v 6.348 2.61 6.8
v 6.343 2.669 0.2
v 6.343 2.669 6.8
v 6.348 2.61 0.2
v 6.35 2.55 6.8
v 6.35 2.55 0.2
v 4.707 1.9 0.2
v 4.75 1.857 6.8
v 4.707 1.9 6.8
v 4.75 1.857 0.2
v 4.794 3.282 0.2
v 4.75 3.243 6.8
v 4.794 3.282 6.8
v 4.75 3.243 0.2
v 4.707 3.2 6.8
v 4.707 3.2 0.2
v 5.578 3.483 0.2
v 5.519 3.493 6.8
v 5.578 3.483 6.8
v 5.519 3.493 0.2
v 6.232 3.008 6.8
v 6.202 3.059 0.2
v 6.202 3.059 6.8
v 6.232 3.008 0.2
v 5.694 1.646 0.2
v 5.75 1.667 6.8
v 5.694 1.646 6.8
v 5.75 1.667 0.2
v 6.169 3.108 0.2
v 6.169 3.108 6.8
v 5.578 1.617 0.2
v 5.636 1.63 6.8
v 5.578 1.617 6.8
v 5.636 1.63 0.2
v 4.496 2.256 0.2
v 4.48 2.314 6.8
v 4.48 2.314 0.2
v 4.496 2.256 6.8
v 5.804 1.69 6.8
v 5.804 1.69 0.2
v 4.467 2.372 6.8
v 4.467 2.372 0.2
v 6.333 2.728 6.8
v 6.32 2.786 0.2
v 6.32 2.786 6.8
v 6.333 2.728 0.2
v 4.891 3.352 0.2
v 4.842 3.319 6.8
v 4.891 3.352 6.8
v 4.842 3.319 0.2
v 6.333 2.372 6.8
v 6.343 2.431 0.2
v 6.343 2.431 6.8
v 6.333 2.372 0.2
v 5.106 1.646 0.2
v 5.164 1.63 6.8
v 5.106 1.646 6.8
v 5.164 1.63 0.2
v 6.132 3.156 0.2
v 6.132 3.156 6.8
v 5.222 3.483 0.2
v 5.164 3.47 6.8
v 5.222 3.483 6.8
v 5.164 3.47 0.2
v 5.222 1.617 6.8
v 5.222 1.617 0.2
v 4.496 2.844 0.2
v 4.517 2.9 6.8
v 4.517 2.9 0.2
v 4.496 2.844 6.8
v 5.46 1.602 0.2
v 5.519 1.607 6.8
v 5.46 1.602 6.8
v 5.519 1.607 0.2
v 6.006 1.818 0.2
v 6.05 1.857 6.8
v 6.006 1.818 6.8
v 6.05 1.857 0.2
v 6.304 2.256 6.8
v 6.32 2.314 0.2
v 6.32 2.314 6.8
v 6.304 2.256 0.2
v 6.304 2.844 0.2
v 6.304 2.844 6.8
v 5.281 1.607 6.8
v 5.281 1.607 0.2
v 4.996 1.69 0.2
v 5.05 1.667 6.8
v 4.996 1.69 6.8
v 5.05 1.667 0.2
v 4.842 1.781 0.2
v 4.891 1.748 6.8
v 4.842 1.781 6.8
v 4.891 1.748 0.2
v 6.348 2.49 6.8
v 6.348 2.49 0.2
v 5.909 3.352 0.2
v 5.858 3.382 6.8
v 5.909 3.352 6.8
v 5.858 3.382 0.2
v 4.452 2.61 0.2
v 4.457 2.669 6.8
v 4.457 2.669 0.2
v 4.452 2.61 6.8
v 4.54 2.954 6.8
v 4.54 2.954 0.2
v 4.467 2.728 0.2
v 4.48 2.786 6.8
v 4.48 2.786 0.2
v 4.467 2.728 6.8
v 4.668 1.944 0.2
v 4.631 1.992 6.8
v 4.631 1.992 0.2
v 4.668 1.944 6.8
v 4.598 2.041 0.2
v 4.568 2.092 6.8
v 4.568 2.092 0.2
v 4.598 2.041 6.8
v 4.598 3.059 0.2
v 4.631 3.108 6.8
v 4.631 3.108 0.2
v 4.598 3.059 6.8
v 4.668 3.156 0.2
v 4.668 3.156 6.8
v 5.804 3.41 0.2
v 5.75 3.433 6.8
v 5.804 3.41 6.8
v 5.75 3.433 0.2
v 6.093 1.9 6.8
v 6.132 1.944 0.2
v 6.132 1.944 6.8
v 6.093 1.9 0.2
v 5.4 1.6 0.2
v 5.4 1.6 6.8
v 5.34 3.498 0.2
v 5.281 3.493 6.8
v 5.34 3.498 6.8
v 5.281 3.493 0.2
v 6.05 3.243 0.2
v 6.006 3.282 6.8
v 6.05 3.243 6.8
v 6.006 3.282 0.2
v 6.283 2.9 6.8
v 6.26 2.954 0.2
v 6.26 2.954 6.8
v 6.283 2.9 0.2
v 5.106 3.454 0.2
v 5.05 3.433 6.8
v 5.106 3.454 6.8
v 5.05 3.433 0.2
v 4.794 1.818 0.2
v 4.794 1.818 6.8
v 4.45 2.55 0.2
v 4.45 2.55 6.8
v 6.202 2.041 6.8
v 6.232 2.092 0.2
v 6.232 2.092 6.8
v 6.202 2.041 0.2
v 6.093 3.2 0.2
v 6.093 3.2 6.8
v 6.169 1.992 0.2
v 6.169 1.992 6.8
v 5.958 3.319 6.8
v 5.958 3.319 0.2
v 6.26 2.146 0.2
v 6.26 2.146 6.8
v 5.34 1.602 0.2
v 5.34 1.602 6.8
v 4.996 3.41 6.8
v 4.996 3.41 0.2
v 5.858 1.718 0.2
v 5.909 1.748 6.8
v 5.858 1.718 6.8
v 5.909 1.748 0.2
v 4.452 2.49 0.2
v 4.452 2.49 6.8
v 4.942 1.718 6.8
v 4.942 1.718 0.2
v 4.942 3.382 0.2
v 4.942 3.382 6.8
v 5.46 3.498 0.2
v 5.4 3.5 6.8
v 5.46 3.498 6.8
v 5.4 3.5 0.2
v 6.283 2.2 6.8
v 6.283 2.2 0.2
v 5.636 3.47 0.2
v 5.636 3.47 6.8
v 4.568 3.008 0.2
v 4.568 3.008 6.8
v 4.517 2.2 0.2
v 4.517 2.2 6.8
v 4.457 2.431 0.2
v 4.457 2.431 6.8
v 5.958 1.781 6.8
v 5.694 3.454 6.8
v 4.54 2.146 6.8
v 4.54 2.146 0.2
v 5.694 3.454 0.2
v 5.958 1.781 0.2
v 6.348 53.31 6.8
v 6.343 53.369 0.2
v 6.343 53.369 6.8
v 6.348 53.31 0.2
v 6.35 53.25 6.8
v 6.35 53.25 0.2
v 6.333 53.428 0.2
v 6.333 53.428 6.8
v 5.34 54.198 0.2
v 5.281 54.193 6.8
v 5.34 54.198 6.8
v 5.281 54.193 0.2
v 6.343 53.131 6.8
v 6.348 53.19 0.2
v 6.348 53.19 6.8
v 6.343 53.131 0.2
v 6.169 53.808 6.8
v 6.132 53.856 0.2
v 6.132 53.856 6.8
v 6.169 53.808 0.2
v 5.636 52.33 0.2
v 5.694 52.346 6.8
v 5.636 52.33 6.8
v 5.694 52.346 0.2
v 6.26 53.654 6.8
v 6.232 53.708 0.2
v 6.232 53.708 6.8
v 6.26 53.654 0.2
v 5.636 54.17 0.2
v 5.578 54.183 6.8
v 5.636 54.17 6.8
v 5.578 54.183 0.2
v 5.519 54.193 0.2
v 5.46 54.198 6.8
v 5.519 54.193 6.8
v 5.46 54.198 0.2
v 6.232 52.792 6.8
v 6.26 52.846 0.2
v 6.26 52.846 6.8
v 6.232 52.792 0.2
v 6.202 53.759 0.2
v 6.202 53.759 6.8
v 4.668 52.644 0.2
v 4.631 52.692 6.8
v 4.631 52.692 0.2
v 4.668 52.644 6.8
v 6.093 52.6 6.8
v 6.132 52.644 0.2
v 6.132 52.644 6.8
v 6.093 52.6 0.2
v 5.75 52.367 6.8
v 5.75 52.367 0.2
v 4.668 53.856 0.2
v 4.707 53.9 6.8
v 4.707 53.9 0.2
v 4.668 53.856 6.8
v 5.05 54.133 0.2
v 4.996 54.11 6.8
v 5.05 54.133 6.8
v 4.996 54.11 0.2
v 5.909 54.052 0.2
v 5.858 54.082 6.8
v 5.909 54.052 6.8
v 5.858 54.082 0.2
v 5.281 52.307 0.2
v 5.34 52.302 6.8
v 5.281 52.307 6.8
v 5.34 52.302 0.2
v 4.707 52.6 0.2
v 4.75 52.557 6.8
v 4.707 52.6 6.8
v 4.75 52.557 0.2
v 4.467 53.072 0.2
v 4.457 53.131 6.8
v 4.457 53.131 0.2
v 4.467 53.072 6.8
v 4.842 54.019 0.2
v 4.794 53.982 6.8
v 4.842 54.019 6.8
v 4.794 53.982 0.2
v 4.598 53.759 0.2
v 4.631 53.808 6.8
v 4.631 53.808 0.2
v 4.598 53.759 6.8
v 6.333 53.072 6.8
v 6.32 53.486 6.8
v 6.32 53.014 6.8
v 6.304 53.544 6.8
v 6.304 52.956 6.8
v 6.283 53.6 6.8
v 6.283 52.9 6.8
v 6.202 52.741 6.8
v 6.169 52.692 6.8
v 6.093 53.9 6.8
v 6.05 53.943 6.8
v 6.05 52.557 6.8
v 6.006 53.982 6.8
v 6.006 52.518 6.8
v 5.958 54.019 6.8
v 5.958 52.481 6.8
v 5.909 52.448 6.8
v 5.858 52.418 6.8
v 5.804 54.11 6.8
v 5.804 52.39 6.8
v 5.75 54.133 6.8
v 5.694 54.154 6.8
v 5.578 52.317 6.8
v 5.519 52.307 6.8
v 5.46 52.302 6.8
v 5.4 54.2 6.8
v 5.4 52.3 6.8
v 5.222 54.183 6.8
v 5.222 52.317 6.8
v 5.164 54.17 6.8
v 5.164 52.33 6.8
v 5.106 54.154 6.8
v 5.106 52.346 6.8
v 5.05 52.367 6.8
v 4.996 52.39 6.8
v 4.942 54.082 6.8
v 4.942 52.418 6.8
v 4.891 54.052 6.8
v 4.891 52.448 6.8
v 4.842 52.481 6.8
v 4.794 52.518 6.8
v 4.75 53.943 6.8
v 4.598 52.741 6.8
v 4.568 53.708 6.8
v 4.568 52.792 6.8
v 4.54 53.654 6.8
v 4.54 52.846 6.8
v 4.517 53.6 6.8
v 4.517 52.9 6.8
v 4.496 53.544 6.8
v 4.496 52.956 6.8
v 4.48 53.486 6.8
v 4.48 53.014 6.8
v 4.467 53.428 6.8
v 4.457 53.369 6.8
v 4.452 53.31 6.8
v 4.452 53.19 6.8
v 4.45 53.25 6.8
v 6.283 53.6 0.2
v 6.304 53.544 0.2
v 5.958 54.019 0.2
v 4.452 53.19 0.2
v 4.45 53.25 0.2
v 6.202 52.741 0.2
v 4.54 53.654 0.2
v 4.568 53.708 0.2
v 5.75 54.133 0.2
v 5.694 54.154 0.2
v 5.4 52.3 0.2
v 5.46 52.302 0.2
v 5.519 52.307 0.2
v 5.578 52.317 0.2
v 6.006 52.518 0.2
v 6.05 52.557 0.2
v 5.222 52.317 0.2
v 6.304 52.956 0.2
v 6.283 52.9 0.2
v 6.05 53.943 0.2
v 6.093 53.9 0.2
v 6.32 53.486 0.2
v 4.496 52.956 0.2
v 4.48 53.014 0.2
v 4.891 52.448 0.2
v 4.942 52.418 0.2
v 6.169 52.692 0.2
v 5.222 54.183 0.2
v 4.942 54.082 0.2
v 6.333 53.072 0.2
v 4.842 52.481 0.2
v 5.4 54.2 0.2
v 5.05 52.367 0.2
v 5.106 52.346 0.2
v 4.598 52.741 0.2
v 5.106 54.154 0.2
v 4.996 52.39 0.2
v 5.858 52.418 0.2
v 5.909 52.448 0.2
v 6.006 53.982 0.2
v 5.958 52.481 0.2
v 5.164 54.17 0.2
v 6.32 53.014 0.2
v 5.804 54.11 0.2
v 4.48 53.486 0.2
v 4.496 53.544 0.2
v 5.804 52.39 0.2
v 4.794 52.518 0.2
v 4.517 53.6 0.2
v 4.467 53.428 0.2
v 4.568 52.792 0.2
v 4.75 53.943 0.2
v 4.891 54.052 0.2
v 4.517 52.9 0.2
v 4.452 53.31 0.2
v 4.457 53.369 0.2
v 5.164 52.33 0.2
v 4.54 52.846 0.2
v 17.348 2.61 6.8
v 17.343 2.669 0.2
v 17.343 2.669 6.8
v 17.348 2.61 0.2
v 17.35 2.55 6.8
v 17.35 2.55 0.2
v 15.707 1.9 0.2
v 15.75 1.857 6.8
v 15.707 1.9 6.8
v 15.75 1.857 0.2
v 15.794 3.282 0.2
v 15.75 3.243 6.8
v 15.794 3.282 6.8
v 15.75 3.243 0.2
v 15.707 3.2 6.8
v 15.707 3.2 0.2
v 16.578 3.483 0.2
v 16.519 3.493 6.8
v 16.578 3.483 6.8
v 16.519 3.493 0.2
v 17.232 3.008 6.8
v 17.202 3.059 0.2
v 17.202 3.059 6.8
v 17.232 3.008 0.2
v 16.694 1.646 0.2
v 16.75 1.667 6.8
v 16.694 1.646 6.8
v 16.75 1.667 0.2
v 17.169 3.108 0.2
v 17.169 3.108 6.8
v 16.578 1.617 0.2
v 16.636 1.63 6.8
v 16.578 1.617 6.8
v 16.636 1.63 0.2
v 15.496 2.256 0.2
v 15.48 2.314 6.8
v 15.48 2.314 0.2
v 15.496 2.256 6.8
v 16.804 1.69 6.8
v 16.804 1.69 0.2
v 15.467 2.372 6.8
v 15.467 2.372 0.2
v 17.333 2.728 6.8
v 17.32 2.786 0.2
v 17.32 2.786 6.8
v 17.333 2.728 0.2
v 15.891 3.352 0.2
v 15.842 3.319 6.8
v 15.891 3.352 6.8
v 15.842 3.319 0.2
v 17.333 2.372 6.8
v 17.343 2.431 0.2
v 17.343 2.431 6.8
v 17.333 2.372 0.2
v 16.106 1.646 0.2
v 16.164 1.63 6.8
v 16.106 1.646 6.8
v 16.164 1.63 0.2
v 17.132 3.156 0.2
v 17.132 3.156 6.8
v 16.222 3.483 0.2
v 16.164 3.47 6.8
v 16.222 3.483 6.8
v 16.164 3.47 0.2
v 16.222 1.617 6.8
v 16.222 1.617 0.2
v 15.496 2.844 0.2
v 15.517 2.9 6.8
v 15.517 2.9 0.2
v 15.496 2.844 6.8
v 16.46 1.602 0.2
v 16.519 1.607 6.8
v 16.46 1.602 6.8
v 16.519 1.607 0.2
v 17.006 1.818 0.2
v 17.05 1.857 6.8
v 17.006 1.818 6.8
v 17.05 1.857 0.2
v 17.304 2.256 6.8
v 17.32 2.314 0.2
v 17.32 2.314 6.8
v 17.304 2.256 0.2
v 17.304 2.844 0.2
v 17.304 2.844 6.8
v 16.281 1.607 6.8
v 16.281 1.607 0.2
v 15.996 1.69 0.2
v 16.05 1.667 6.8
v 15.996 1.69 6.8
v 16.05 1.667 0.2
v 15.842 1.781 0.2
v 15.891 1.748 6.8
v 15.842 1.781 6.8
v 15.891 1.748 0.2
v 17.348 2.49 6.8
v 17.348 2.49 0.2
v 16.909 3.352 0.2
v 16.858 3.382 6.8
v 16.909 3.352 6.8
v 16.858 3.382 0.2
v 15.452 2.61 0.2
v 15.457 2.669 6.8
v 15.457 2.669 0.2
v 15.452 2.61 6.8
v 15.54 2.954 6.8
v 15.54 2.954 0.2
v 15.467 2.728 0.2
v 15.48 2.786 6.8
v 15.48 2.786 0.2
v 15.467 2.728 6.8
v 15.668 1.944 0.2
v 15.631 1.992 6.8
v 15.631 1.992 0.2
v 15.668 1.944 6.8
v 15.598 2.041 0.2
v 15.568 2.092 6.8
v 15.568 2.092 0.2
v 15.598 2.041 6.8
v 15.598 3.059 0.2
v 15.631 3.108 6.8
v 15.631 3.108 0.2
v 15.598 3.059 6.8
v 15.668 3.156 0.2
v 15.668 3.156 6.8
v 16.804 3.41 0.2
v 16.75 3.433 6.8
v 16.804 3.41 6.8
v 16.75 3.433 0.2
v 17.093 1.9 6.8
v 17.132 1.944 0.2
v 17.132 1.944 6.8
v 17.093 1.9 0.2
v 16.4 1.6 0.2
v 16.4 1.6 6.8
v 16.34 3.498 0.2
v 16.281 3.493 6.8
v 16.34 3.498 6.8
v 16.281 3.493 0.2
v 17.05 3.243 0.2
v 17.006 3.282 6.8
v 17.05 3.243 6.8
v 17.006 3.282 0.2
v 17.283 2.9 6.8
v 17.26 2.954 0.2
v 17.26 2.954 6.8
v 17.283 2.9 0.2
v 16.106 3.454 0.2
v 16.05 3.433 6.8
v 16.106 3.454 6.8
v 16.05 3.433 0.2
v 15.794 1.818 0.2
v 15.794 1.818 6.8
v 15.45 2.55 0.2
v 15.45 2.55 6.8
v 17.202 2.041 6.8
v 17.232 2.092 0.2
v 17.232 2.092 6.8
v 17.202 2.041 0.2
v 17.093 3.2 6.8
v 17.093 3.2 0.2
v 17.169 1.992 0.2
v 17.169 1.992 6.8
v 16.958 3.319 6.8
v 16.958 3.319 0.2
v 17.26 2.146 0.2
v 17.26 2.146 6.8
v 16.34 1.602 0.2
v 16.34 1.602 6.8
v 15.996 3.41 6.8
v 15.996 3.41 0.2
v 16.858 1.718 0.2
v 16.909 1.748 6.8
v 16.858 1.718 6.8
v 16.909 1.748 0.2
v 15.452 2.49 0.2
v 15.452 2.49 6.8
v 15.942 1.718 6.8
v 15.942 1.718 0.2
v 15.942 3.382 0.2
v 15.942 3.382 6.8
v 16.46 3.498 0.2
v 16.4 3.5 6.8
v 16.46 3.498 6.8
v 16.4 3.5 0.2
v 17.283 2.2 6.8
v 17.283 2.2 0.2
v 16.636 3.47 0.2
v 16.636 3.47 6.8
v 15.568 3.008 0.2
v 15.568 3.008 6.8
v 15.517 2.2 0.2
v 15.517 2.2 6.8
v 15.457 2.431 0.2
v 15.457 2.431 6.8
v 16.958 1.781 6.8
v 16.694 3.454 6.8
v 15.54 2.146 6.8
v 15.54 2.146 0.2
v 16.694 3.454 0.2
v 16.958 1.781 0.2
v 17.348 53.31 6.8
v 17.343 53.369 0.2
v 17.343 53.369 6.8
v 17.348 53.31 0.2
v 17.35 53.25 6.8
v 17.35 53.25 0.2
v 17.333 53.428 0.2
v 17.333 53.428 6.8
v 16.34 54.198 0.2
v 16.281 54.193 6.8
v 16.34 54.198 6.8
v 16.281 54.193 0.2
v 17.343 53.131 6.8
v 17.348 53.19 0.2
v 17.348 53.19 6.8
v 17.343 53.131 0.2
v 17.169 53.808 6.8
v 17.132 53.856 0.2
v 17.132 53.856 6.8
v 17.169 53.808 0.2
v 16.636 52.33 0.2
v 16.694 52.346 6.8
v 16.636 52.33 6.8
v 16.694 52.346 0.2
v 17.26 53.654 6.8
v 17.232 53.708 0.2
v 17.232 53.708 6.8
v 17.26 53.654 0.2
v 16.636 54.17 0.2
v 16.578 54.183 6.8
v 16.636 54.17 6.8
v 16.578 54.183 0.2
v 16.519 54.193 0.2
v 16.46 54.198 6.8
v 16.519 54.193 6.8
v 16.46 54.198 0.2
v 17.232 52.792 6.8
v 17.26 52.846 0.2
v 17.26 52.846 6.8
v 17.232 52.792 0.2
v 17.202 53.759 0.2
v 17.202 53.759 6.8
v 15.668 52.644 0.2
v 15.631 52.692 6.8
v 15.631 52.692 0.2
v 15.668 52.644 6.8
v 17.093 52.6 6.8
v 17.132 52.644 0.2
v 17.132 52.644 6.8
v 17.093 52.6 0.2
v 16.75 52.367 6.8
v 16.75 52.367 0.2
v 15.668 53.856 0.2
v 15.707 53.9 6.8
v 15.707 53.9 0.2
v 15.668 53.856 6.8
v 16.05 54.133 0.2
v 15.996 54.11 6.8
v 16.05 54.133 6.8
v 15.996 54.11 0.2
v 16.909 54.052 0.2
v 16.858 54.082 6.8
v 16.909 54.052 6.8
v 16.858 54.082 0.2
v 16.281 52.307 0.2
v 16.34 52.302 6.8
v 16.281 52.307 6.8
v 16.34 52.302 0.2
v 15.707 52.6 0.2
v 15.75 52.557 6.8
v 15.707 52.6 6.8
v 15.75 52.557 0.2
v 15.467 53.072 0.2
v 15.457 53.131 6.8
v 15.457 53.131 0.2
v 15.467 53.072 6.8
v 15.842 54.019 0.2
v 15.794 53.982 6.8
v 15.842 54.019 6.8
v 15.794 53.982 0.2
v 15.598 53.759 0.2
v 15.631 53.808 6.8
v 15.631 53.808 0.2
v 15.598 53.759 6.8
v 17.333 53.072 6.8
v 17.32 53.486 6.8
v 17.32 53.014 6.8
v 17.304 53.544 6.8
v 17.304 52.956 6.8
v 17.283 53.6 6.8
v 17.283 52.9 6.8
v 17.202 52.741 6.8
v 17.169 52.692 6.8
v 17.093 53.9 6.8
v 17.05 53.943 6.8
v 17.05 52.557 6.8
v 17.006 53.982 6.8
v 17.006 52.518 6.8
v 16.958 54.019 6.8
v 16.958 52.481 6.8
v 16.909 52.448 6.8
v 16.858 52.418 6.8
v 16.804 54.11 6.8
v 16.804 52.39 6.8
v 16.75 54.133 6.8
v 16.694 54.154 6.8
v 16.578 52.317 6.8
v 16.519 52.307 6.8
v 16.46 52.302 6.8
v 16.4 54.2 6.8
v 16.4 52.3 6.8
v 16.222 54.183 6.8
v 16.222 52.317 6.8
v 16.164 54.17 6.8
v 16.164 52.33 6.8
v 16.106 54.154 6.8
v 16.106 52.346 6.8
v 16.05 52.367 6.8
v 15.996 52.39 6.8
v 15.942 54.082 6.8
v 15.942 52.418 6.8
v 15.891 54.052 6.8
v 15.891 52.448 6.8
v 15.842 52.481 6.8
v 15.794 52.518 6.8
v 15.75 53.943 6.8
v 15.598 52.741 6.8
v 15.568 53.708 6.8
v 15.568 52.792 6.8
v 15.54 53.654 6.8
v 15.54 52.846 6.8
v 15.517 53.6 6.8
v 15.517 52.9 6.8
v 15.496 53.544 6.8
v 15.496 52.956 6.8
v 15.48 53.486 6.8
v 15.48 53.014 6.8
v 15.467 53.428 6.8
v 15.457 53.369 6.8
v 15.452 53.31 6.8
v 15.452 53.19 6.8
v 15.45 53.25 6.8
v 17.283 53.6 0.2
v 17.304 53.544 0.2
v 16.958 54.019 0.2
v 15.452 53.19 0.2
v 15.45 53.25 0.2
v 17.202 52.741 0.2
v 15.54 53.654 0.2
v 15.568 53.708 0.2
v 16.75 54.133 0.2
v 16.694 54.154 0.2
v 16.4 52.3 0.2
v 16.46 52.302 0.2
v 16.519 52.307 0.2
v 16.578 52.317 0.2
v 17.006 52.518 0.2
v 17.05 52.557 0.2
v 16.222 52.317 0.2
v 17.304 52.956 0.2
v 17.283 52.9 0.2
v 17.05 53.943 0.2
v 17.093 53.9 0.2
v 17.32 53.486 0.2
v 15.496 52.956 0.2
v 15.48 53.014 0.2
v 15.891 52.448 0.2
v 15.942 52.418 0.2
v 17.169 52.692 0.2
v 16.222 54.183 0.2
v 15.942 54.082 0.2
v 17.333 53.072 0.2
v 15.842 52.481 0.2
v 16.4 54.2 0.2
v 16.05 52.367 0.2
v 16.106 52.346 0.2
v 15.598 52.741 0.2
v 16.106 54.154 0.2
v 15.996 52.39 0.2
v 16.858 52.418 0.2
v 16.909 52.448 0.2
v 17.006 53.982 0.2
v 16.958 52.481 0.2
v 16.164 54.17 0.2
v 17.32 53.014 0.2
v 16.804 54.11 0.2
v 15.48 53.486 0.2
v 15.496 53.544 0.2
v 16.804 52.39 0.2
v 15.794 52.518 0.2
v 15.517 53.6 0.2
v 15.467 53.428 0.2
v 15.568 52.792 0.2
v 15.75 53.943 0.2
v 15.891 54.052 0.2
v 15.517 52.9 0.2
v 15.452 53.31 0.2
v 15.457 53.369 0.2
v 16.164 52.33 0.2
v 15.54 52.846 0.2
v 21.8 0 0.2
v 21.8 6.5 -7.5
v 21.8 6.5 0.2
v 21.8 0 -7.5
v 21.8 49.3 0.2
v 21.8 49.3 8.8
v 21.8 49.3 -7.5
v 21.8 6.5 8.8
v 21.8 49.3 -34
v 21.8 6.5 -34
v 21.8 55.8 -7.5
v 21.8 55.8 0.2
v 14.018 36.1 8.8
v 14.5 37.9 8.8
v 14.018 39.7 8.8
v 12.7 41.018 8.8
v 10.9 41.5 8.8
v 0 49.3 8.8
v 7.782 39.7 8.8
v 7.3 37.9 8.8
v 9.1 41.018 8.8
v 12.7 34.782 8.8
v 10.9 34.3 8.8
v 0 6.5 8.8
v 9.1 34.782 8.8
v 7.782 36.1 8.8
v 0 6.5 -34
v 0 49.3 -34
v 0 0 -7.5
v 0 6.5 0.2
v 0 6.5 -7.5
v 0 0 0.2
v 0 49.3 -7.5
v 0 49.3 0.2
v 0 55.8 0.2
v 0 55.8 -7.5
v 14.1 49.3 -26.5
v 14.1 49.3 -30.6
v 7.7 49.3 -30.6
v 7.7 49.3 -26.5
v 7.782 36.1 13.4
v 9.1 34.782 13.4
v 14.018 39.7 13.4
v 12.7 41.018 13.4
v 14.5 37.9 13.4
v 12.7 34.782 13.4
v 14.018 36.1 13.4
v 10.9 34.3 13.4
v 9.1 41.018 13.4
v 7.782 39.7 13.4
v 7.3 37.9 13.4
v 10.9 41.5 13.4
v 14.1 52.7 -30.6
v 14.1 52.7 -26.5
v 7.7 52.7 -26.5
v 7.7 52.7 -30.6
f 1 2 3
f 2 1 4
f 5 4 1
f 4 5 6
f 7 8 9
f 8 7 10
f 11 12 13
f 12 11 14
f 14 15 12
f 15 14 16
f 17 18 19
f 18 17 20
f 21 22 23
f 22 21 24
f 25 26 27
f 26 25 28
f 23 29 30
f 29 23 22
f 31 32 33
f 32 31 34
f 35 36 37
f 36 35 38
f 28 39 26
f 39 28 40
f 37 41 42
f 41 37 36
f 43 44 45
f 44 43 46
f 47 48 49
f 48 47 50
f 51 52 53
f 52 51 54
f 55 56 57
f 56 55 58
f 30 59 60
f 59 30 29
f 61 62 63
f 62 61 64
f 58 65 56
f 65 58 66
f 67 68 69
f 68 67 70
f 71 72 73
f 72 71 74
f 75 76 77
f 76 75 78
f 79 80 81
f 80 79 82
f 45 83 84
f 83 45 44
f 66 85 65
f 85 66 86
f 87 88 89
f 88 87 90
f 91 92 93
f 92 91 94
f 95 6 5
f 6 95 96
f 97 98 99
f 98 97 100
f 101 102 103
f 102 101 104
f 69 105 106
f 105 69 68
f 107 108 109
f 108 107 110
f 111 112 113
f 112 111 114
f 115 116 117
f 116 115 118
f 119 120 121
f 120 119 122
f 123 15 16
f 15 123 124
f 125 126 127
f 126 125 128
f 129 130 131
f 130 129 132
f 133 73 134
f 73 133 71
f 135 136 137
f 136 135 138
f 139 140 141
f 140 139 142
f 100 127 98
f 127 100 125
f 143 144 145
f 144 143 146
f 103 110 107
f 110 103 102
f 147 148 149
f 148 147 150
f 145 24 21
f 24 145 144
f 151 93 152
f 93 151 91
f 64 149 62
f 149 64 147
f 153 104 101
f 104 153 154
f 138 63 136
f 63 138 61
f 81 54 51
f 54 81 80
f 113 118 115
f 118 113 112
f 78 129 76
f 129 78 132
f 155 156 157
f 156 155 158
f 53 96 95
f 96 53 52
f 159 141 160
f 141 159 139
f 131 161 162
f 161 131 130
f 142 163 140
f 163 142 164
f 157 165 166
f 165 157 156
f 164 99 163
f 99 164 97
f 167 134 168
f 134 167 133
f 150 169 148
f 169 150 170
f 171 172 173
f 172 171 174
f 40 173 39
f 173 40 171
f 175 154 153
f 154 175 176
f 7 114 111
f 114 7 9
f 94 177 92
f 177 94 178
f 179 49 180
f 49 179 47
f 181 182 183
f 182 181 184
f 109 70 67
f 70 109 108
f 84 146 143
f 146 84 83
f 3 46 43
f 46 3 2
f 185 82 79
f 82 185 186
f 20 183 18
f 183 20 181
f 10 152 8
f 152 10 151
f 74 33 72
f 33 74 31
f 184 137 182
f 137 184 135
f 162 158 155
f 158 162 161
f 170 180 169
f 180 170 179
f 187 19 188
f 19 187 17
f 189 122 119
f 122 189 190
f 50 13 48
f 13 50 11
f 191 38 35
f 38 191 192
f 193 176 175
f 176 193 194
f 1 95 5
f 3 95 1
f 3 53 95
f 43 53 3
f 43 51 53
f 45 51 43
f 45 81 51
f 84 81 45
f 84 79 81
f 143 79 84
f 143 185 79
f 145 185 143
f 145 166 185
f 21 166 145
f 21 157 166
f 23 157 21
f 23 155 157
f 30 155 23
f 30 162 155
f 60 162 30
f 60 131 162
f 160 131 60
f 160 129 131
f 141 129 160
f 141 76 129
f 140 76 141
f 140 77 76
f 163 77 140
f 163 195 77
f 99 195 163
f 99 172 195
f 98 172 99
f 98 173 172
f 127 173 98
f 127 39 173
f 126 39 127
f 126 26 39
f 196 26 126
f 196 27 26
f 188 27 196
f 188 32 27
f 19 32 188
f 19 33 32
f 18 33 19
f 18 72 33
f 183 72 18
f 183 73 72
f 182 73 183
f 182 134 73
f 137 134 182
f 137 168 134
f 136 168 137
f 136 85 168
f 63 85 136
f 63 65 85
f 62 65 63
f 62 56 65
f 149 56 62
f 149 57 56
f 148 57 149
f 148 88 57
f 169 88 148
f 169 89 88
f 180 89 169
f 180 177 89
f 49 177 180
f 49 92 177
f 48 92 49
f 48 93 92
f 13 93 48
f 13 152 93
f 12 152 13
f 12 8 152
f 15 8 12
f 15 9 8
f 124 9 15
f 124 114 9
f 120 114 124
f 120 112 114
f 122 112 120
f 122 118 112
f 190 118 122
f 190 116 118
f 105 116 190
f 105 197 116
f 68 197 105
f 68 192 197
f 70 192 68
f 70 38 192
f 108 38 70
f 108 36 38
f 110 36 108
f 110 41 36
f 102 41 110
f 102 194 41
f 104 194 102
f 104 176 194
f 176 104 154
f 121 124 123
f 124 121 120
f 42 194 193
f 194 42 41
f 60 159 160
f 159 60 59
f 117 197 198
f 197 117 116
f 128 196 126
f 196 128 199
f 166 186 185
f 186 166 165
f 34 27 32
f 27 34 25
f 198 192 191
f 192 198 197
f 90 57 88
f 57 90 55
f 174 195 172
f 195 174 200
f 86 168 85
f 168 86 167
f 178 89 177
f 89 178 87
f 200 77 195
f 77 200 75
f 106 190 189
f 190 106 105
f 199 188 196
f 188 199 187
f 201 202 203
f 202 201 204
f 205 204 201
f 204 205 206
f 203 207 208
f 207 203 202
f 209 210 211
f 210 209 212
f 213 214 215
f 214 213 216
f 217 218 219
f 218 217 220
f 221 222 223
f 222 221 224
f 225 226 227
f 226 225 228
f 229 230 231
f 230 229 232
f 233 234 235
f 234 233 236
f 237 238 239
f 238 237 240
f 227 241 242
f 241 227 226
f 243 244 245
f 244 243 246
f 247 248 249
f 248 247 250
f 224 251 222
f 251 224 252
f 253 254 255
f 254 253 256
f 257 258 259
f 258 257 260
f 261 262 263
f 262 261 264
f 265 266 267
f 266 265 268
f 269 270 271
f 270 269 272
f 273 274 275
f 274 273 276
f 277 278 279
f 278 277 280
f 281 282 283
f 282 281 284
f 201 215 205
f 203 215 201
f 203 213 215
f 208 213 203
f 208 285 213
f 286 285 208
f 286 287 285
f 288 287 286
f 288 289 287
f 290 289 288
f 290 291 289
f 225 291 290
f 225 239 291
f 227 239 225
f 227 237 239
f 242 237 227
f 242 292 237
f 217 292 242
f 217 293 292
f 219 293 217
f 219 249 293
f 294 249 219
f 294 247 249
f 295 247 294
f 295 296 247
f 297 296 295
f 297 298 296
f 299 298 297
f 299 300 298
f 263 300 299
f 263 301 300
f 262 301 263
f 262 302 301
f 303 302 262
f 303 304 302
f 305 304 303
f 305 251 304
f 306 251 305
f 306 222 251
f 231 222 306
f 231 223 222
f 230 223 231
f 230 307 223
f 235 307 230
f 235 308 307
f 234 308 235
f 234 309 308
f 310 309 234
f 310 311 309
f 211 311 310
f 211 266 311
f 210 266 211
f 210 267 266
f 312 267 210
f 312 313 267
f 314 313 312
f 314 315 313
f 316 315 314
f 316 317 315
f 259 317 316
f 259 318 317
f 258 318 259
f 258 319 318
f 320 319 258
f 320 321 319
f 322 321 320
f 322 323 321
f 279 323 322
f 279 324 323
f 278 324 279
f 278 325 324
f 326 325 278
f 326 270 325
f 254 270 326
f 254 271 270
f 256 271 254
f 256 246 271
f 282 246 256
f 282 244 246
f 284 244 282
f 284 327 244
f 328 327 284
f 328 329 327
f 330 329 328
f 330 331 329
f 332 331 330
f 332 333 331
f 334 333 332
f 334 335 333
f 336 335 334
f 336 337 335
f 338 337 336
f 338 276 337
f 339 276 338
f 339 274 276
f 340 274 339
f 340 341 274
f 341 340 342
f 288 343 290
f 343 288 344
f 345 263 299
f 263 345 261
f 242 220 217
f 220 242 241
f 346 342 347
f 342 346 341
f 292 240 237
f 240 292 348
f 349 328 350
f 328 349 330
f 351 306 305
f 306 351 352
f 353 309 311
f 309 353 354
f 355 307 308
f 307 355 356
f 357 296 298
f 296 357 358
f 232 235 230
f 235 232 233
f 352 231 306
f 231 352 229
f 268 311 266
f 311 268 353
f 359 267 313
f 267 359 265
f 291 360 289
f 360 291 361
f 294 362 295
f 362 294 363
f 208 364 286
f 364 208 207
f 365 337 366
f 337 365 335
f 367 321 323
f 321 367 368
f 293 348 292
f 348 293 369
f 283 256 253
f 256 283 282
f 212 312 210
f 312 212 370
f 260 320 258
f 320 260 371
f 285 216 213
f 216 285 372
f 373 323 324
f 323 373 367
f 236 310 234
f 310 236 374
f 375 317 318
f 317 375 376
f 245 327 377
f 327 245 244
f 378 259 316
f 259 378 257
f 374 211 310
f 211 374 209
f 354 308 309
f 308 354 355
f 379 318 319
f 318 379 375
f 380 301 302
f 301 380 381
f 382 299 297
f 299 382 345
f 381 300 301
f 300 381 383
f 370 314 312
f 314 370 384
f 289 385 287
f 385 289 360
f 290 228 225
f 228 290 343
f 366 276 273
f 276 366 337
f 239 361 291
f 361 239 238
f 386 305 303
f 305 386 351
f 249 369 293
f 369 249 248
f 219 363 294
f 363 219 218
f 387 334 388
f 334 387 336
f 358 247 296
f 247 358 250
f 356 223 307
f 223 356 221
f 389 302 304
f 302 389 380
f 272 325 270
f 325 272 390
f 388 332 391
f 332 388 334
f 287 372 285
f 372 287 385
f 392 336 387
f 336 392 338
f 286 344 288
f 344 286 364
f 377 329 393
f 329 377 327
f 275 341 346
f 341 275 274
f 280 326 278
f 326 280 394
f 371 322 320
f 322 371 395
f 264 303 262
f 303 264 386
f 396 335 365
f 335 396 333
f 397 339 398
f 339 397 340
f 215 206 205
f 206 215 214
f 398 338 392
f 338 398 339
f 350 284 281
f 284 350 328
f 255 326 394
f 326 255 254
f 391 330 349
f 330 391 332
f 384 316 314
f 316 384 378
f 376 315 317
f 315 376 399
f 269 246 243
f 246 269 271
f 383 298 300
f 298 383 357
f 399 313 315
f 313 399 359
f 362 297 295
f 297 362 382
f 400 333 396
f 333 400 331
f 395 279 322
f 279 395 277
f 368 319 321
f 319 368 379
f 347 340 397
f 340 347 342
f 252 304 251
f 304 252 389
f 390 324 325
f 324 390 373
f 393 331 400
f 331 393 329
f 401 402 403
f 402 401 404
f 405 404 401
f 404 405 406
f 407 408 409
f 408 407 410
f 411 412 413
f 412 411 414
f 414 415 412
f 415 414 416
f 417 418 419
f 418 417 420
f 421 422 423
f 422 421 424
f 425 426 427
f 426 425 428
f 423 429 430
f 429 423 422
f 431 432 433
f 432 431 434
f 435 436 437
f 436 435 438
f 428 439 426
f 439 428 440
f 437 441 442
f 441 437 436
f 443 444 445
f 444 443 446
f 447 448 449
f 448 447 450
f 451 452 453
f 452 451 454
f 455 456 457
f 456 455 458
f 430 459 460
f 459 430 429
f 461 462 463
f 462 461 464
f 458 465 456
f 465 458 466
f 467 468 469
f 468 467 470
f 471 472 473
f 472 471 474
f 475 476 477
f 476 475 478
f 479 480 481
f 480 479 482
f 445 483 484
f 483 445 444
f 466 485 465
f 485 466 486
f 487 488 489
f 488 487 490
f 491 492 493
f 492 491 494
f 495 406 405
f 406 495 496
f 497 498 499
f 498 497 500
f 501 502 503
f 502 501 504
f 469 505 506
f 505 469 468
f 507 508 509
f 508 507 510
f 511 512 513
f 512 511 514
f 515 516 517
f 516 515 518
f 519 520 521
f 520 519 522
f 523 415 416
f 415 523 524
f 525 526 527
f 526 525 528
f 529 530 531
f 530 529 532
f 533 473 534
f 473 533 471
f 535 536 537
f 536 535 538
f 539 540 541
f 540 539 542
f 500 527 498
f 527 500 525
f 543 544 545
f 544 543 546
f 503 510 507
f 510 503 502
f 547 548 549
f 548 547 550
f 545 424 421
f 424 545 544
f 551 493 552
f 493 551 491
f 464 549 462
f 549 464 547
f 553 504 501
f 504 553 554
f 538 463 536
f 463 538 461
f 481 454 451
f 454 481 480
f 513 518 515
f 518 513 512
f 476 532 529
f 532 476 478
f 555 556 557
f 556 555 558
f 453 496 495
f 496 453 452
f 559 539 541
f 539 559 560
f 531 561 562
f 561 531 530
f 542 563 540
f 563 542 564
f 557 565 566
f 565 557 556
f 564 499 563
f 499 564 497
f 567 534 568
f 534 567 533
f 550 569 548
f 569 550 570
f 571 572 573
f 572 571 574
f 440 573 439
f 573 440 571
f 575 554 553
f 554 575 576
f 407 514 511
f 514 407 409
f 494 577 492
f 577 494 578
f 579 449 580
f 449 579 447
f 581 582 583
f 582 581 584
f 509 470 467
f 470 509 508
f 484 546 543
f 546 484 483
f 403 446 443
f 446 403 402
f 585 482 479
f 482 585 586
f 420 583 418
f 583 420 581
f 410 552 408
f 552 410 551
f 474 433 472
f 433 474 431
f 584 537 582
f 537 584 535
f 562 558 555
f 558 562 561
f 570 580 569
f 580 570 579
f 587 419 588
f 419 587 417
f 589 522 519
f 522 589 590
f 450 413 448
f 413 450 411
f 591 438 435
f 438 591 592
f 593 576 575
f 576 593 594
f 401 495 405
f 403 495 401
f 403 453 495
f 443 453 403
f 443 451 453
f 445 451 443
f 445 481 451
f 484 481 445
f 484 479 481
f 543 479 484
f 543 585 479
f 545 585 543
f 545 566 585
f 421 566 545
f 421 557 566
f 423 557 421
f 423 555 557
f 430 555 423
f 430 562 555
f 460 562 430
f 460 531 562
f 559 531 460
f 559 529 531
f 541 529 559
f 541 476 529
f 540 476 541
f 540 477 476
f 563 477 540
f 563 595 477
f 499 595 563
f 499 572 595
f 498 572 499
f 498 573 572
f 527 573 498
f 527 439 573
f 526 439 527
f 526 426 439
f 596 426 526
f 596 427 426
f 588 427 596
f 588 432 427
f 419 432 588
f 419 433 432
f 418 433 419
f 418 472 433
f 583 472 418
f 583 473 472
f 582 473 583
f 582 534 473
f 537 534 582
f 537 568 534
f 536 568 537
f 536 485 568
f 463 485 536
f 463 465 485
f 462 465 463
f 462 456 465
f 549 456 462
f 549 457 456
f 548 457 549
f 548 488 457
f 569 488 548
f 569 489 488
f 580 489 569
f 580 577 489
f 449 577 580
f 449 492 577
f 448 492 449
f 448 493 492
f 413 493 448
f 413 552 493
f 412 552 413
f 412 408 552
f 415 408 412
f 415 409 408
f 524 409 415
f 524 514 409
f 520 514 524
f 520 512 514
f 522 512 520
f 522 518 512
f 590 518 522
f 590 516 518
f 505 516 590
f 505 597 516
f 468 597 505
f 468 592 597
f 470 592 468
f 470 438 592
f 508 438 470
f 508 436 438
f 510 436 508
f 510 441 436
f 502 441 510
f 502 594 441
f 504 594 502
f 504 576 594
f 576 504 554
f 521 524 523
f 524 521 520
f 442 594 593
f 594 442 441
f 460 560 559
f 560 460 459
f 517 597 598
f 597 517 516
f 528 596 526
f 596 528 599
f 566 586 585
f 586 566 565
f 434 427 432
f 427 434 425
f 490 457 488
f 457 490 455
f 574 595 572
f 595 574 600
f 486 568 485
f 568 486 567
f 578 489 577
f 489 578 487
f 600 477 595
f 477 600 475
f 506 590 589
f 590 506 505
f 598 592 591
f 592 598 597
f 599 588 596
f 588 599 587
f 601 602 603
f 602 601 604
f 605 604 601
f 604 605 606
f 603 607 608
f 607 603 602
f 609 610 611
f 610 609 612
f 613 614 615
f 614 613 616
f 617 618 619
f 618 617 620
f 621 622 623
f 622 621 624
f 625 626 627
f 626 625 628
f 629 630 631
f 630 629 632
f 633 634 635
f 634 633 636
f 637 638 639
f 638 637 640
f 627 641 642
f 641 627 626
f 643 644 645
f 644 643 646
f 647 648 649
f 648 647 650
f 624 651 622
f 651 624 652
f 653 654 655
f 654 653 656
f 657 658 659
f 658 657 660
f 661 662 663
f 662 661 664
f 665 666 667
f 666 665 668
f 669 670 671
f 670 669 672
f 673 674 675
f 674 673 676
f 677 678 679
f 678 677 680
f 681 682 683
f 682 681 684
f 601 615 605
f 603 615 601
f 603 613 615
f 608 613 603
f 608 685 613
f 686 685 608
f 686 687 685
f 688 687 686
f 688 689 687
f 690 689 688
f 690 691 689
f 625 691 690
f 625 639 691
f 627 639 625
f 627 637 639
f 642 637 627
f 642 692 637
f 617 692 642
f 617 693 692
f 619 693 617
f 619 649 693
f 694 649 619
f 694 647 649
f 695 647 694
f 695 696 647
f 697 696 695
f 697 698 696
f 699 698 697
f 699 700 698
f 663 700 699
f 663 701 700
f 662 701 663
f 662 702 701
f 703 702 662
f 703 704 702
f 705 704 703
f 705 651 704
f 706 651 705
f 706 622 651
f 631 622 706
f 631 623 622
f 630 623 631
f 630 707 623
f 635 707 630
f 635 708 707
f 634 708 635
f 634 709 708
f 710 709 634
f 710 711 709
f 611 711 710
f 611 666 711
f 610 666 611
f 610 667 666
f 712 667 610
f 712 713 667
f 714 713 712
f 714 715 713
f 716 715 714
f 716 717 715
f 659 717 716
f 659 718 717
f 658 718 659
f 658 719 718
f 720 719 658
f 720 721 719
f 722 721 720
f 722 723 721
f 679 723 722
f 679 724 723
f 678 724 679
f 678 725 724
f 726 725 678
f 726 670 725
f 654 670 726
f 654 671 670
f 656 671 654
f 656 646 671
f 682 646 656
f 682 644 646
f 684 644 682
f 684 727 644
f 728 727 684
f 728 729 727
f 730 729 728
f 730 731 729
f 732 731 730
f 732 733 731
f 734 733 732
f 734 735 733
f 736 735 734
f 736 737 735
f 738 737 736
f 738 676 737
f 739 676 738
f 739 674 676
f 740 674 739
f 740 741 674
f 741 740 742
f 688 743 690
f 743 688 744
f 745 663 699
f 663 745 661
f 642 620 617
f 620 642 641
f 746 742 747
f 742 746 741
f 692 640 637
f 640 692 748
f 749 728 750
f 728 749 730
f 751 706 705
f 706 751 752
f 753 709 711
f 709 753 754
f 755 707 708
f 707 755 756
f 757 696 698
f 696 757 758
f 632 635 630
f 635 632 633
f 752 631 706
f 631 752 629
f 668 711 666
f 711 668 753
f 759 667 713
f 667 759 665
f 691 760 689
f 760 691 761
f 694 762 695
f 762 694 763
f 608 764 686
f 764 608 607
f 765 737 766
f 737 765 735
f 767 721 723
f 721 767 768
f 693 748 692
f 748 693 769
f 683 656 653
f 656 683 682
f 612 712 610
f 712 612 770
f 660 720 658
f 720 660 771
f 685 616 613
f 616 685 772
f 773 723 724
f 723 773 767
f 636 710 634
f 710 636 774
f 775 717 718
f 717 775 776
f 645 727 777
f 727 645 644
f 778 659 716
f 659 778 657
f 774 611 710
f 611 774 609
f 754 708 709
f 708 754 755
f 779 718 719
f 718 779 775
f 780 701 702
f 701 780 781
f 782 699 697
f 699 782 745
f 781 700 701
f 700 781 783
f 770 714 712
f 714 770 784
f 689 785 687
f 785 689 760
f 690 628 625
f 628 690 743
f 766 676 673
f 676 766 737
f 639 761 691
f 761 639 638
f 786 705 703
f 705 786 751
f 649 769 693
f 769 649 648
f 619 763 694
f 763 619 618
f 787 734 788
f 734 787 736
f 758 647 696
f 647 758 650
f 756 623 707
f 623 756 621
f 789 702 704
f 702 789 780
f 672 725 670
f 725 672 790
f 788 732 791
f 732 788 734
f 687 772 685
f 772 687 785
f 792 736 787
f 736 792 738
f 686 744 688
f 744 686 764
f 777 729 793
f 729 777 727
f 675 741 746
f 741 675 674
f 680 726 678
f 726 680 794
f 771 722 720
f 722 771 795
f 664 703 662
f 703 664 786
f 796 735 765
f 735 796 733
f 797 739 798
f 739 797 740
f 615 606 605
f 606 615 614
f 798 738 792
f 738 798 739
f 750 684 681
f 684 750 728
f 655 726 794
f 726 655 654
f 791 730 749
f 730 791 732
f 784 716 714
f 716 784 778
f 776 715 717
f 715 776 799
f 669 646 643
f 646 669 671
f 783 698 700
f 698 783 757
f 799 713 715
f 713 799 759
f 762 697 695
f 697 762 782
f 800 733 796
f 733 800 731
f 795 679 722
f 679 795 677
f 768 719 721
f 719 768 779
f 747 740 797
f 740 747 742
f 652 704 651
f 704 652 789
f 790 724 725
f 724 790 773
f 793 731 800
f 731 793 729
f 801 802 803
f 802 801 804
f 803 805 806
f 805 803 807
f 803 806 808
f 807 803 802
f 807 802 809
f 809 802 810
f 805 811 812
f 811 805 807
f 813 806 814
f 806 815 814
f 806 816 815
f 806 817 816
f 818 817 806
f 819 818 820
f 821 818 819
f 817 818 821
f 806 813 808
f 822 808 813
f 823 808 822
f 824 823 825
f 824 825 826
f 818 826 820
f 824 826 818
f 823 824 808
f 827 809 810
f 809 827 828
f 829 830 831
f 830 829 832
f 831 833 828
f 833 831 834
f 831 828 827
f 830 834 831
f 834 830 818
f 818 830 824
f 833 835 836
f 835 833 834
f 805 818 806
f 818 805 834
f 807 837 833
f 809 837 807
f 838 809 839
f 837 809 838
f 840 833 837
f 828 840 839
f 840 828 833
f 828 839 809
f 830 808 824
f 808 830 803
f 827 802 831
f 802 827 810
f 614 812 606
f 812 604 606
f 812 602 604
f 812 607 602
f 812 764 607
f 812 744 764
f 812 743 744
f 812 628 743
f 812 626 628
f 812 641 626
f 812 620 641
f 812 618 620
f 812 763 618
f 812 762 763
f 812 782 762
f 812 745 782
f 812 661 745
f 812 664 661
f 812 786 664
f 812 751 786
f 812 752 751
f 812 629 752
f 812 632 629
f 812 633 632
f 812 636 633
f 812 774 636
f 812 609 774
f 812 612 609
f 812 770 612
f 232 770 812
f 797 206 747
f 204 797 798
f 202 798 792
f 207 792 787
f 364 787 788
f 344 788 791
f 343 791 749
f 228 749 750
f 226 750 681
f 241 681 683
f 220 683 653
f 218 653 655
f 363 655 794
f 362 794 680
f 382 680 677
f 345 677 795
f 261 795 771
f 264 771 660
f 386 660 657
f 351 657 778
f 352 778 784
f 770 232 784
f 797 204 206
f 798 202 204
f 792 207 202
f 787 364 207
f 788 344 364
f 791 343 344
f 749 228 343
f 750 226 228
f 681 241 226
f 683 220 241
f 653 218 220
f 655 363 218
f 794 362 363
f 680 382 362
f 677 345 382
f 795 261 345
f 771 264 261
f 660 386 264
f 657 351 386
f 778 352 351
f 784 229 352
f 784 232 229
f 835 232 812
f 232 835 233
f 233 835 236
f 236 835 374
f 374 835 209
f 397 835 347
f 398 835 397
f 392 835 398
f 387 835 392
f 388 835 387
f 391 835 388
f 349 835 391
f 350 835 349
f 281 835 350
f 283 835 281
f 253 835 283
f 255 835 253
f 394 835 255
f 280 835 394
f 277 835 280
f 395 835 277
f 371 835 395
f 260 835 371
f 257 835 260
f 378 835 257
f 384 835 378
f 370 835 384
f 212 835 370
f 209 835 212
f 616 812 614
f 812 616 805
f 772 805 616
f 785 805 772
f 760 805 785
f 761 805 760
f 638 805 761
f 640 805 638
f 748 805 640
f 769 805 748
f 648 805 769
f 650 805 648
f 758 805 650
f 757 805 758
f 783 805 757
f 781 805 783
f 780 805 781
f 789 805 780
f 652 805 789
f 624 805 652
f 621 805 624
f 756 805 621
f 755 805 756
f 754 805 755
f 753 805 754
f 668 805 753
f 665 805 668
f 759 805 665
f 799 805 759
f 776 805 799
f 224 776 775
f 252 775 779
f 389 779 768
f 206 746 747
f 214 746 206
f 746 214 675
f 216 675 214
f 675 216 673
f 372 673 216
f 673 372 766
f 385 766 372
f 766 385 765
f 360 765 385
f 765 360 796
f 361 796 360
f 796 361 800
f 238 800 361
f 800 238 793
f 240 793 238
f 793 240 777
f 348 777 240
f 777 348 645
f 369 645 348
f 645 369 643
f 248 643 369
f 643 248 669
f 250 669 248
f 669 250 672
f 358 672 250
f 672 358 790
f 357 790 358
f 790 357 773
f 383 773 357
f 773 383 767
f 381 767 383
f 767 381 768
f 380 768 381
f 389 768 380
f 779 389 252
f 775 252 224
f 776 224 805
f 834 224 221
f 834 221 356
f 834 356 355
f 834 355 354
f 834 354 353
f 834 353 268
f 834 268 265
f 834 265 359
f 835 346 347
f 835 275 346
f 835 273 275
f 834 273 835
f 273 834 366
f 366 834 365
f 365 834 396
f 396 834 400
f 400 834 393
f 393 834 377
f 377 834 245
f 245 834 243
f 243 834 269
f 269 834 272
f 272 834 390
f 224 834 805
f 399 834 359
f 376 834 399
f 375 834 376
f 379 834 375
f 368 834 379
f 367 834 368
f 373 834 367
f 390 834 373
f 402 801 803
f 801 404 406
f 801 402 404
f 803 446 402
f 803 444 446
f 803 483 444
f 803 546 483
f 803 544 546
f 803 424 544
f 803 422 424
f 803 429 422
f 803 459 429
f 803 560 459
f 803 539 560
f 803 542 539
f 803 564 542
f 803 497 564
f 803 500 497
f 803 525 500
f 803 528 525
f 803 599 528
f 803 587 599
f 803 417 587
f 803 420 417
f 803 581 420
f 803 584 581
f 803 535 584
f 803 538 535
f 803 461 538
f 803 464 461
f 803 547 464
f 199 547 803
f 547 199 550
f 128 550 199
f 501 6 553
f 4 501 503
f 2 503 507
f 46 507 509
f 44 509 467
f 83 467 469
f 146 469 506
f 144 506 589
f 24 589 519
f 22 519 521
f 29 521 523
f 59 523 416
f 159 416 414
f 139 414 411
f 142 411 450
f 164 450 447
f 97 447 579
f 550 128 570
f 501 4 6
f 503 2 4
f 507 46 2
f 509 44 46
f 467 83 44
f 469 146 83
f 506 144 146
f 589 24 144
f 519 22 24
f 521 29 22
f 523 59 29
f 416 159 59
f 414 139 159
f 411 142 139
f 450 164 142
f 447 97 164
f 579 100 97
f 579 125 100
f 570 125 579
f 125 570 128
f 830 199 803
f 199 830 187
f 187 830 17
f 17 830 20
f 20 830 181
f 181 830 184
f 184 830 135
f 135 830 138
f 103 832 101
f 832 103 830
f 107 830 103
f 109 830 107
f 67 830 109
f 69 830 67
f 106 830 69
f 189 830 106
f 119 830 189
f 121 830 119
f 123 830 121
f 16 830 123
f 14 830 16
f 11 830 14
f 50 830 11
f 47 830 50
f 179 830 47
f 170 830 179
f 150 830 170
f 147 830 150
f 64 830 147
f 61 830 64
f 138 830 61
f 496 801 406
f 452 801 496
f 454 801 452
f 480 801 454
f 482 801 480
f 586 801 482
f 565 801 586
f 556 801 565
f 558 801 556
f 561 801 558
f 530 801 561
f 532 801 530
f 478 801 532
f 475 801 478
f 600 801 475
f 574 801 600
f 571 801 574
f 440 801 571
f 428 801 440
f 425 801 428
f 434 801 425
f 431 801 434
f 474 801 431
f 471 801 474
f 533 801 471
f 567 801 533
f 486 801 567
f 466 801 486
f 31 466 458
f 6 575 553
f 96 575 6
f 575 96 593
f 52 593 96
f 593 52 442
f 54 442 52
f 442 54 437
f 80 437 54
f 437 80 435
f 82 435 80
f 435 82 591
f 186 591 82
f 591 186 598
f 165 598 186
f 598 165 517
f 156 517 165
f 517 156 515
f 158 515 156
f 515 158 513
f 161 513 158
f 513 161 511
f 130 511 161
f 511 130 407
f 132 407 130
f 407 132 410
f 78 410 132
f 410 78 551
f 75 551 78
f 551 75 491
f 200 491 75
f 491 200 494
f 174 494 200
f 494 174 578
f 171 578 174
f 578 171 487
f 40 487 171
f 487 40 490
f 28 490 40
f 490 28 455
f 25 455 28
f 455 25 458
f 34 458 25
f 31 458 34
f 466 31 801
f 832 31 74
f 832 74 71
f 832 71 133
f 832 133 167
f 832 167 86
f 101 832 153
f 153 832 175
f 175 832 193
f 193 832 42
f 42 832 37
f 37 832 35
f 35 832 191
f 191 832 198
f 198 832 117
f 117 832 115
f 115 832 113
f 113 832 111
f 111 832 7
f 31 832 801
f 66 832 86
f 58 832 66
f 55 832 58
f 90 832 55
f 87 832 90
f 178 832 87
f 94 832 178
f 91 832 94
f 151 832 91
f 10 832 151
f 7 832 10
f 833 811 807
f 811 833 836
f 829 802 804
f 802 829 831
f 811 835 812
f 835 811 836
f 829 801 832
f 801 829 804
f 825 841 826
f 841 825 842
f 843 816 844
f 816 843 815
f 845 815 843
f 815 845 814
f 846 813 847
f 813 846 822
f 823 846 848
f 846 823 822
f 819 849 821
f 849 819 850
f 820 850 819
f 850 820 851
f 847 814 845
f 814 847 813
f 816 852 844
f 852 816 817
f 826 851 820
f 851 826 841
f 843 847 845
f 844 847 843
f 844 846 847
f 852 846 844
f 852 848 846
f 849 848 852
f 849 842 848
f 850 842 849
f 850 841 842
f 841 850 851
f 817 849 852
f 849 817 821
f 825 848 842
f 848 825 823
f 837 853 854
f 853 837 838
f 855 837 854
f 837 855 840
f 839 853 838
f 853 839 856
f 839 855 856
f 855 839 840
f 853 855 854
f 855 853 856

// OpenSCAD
// When calling this module, use toleranceMotor(boolean,boolean,boolean, number); 
// The first boolean determines the bolt direction(true is up, false is down) and 
// the second determines where the module is centered (true centers at the hub, 
// false centers at the motor mount).
// the third boolean determines whether to use the large cylindrical hub or the 
// small metal nub. 
// The Fourth number indicated the tolerance of the motor (default is .4 mm)

//THIS IS FOR IF YOU USE OTHER KINDS OF MOTORS, MOTOROUTCROP IS THE DISTANCE FROM THE MOUNTING PLATE TO THE BUISNESS END OF YOUR MOTOR, IF YOU EVER NEED TO SWITCH TO ANOTHER JUST CHANGE THIS VALUE TO THE ACTUAL VALUE

function StandardServoHeightAbvWings(tolerance=.6)=(StandardServoHeight()-(StandardServoWingsHeight()+StandardServoWingsDist()+tolerance*2));
echo ("StandardServoHeightAboveWings is",(StandardServoHeightAbvWings(.6)));


function StandardServoOutcrop()= StandardServoCylinderHeight()+StandardServoHeightAbvWings();

function StandardServoWingLength()= (StandardServoLength()-StandardServoBaseLength())/2;


//for use when the motor is incorporated into parts
	//this is distance, the short way, from the edge of the motor to the center of the hub
function StandardServoCenterDist()=(StandardServoCylinderDiam()/2) + ((StandardServoLength()-StandardServoBaseLength())/2-StandardServoTolerance()*2); 

//basic motor shape
function StandardServoHeight()=42;
function StandardServoBaseLength()=42;
function StandardServoThickness()=21;

//wings for mounting
function StandardServoWingsHeight()=5.5;
function StandardServoLength()=55;
function StandardServoWingsDist()=26.5;
function StandardServoBoltHeadHeight()=1.4;

//cylinder on top of motor
function StandardServoCylinderHeight()=(46-38);
function StandardServoCylinderDiam()=21;
function StandardServoCylinderDist()=31;

//nub on top of motor
function StandardServoNubHeight()=4.2;
function StandardServoNubDiam(3dPrinterTolerance=.4)=6+3dPrinterTolerance;

//all bolts
function StandardServoBoltHeight()=8; //reflects the actual protrusion of the bolt above the wing
function StandardServoBoltDiam()=1.5;//2.5, but when using screws to fasten into plastic, the threads must run through the plastic

//horn bolts
function hornBoltHeight()=10;

//body bolts
function StandardServoBoltSideDist()=4.35;
function StandardServoBoltEdgeDist()=5;

//cylinder bolts
function StandardServoCylBoltDist()=7.62;

//hub for wires
function StandardServoHubHeight()=3.7;
function StandardServoHubWidth()=6;
function StandardServoHubLength()=3;
function StandardServoHubDist()=3;

//tolerance for servo
function StandardServoTolerance()=.6;

//When calling this module, use StandardServoMotor(boolean,boolean); The first boolean determines the bolt direction(true is up, false is down) and the second determines where the module is centered (true centers at the hub, false centers at the motor mount)

//defining a bolt
module StandardServoBolt(ServoTolerance=StandardServoTolerance())
{
	cylinder(h=StandardServoBoltHeight()+ServoTolerance, r=(StandardServoBoltDiam()+ServoTolerance)/2, $fn=100);
}

module StandardServoHornBolt(ServoTolerance=StandardServoTolerance(), boltLen = 10 )
{	
	union(){
		translate([0,0, boltLen]){
			cylinder(	h= boltLen*2+ServoTolerance, 
						r=(StandardServoBoltDiam()+ServoTolerance)*1.3, 
						$fn=100);
		}
		cylinder(h= boltLen+ServoTolerance, r=(StandardServoBoltDiam()+ServoTolerance)/2, $fn=100);
	}
}

module bodyBolts(boltPlacementZ,ServoTolerance=StandardServoTolerance())
{
	for (i = [0:1]){
		for (j = [0:1]){
			//Use the for loop like binary flags
			translate([	(i*(StandardServoThickness() - StandardServoBoltEdgeDist()*2)),
			           	(j*(StandardServoBaseLength() + StandardServoBoltSideDist()*2)),
			           	boltPlacementZ]){
							//Center the first pin on the hole
							translate([StandardServoBoltEdgeDist(),-StandardServoBoltSideDist(),0]){
								StandardServoBolt(ServoTolerance);
							}
			}
		}
		// notches for the bolts
		translate([	(StandardServoThickness()/2)-1,
					((-1+i)*6)+(StandardServoBaseLength()*i),
					boltPlacementZ]){
			//cube([2,6,5]);
		}
	}
	

}

module StandardServoBlock(boltsUp=true, Cylinder=1, ServoTolerance=StandardServoTolerance(), boltLen =10){
	n=90;
	union()
	{
//basic motor shape
		translate([-ServoTolerance, -ServoTolerance, -ServoTolerance])
		{
			cube([StandardServoThickness()+ServoTolerance*2, StandardServoBaseLength()+ServoTolerance*2, StandardServoHeight()+ServoTolerance*2]);
		}

//wings for mounting
		translate([-ServoTolerance, (-ServoTolerance+((StandardServoBaseLength()-StandardServoLength())/2)), StandardServoWingsDist()-ServoTolerance])
		{
			cube([StandardServoThickness()+ServoTolerance*2, StandardServoLength()+ServoTolerance*2, StandardServoWingsHeight()+ServoTolerance*2+StandardServoBoltHeadHeight()]);
		}

//determines if you should make the cylinder or a nub
if(Cylinder==1){
//cylinder on top of motor
		translate([StandardServoCylinderDiam()/2,StandardServoCylinderDist(),StandardServoHeight()])
		{
			cylinder(StandardServoCylinderHeight()+ServoTolerance*2, StandardServoCylinderDiam()/2+ServoTolerance, StandardServoCylinderDiam()/2+ServoTolerance, 0);

		}

//cylinder bolts
		for (i = [0:n:360]) { 
			//for loop makes a hole every n degrees on a 360 degree sweep
			translate([	StandardServoThickness()/2 + (cos(i)*StandardServoCylBoltDist()),
			           	StandardServoCylinderDist() + (sin(i)*StandardServoCylBoltDist()),
			           	(StandardServoHeight()+StandardServoCylinderHeight())
			           	]){
							StandardServoHornBolt(ServoTolerance,boltLen);
			}
		}
}else{
	if(Cylinder==2){
//nub on top of motor
		translate([StandardServoCylinderDiam()/2,StandardServoCylinderDist(),StandardServoHeight()])
		{
			cylinder(StandardServoNubHeight()+ServoTolerance*2, StandardServoNubDiam()/2+ServoTolerance, StandardServoNubDiam()/2+ServoTolerance, 0);

		}
}else{
	if(Cylinder==3){
	union()
	{
		translate([StandardServoCylinderDiam()/2,StandardServoCylinderDist(),StandardServoHeight()])
		{
			cylinder(StandardServoNubHeight()+ServoTolerance*2, StandardServoNubDiam()/2+ServoTolerance, StandardServoNubDiam()/2+ServoTolerance, 0);

		}

		translate([StandardServoThickness()/2+StandardServoTolerance(),StandardServoCylinderDist(),StandardServoHeight()+StandardServoNubHeight()+ServoTolerance*6])
		{
			Servo_wheel_4_arm_horn();
		}
	}
}
}	
}

		if(boltsUp==true){
			bodyBolts(StandardServoWingsDist()+StandardServoWingsHeight(),ServoTolerance);
		}else{
			bodyBolts(StandardServoWingsDist()-StandardServoBoltHeight(),ServoTolerance);
		}
		
//hub for wires
		translate([(StandardServoThickness()-(StandardServoHubWidth()+ServoTolerance))/2,(StandardServoBaseLength()+ServoTolerance),StandardServoHubDist()])
		{
			cube([StandardServoHubWidth()+ServoTolerance,StandardServoHubLength()+ServoTolerance,StandardServoHubHeight()+ServoTolerance]);
		}
	}
}



//making the motor
module StandardServoMotor(	boltsUp=true, 
							Cylinder=1, 
							hornCentered=false, 
							ServoTolerance=StandardServoTolerance(), 
							hornBoltLength = 10 )
{
	//echo("Horn bolt length ",hornBoltLength);
	if(hornCentered==true){
		if(Cylinder==1){
			translate([-StandardServoThickness()/2,-StandardServoCylinderDist(),-(StandardServoHeight()+StandardServoCylinderHeight())-ServoTolerance*2])
			{
				StandardServoBlock(boltsUp,Cylinder,ServoTolerance,hornBoltLength);
			}
		}else{
			if(Cylinder==2){
			translate([-StandardServoThickness()/2,-StandardServoCylinderDist(),-(StandardServoHeight()+StandardServoNubHeight())-ServoTolerance*2])
			{
				StandardServoBlock(boltsUp,Cylinder,ServoTolerance,hornBoltLength);
			}
			}else{
				translate([-StandardServoThickness()/2,-StandardServoCylinderDist(),-(StandardServoHeight()+StandardServoNubHeight())-ServoTolerance*2-horn_height+.5])
				{
					StandardServoBlock(boltsUp,Cylinder,ServoTolerance,hornBoltLength);
				}
			}
			}
	}else{
		if(boltsUp == true){
			translate([ServoTolerance,(StandardServoLength()-StandardServoBaseLength())/2+ServoTolerance,(-StandardServoHeight()+(StandardServoHeight()-StandardServoWingsDist())-StandardServoWingsHeight()-ServoTolerance*4)])
			{	
				StandardServoBlock(boltsUp,Cylinder,ServoTolerance,hornBoltLength);
			}
		}else{
			translate([ServoTolerance,(StandardServoLength()-StandardServoBaseLength())/2+ServoTolerance,(-StandardServoHeight()+(StandardServoHeight()-StandardServoWingsDist())-StandardServoWingsHeight()-ServoTolerance*4)])
			{	
				StandardServoBlock(boltsUp,Cylinder,ServoTolerance,hornBoltLength);
			}
		}
	}

}


///YOU MIGHT WANT TO CLEAN UP THE PRONGEY GUY

//-------------------------------------------
//-- Futaba 3003 4-arm horn
//-------------------------------------------

//-- Futaba 3003 4-arm horn parameters
a4h_end_diam = 5;
a4h_center_diam = 10;
a4h_arm_length = 15;
a4h_drill_distance = 13.3;

horn_drill_diam = 2;
horn_drill_distance = 8;
horn_height = 4;

///YO FIX THIS

function horn_height()=4;

module horn4(h=5)
{
  union() {
    //-- Center part (is a square)
    cube([a4h_center_diam+0.2,a4h_center_diam+0.2,h],center=true);

    //-- Place the 4 arms in every side of the cube
    for ( i = [0 : 3] ) {
      rotate( [0,0,i*90])
      translate([0, a4h_center_diam/2, 0])
      horn4_arm(h);
    }
  }
}
module horn4_arm(h=5)
{
  translate([0,a4h_arm_length-a4h_end_diam/2,0])
  //-- The arm consist of the perimeter of a cylinder and a cube
  hull() {
    cylinder(r=a4h_end_diam/2, h=h, center=true, $fn=20);
    translate([0,1-a4h_arm_length+a4h_end_diam/2,0])
      cube([a4h_center_diam,2,h],center=true);
  }
}
module Servo_wheel_4_arm_horn()
{    
      horn4(h= horn_height);
}
//--------------------------------------------------------------
//-- Generic module for the horn's drills
//-- Parameters:
//--  d = drill's radial distance (from the horn's center)
//--  n = number of drills
//--  h = wheel height
//--------------------------------------------------------------
module horn_drills(d,n,h)
{
  union() {
    for ( i = [0 : n-1] ) {
        rotate([0,0,i*360/n])
        translate([0,horn_drill_distance,0])
        cylinder(r=horn_drill_diam/2, h=h+10,center=true, $fn=60);  
      }
  }
}




// StandardServoMotor (boolean,number,boolean, number); 
//The first  param determines the bolt direction(true is up, false is down, default=true), 
//the second param determines whether to use the large cylindrical hub (1), 
//				the small metal nub (2), or the 4-arm horn (3)(default=1). 
//The third  param determines where the module is centered (true centers at the hub, false centers at the motor mount, default=false).
//The forth  param indicated the tolerance of the motor (default is .4 mm)
//the Fith   param is the length of the bolts for the horn

StandardServoMotor(true, 2, false, .4, 10);
